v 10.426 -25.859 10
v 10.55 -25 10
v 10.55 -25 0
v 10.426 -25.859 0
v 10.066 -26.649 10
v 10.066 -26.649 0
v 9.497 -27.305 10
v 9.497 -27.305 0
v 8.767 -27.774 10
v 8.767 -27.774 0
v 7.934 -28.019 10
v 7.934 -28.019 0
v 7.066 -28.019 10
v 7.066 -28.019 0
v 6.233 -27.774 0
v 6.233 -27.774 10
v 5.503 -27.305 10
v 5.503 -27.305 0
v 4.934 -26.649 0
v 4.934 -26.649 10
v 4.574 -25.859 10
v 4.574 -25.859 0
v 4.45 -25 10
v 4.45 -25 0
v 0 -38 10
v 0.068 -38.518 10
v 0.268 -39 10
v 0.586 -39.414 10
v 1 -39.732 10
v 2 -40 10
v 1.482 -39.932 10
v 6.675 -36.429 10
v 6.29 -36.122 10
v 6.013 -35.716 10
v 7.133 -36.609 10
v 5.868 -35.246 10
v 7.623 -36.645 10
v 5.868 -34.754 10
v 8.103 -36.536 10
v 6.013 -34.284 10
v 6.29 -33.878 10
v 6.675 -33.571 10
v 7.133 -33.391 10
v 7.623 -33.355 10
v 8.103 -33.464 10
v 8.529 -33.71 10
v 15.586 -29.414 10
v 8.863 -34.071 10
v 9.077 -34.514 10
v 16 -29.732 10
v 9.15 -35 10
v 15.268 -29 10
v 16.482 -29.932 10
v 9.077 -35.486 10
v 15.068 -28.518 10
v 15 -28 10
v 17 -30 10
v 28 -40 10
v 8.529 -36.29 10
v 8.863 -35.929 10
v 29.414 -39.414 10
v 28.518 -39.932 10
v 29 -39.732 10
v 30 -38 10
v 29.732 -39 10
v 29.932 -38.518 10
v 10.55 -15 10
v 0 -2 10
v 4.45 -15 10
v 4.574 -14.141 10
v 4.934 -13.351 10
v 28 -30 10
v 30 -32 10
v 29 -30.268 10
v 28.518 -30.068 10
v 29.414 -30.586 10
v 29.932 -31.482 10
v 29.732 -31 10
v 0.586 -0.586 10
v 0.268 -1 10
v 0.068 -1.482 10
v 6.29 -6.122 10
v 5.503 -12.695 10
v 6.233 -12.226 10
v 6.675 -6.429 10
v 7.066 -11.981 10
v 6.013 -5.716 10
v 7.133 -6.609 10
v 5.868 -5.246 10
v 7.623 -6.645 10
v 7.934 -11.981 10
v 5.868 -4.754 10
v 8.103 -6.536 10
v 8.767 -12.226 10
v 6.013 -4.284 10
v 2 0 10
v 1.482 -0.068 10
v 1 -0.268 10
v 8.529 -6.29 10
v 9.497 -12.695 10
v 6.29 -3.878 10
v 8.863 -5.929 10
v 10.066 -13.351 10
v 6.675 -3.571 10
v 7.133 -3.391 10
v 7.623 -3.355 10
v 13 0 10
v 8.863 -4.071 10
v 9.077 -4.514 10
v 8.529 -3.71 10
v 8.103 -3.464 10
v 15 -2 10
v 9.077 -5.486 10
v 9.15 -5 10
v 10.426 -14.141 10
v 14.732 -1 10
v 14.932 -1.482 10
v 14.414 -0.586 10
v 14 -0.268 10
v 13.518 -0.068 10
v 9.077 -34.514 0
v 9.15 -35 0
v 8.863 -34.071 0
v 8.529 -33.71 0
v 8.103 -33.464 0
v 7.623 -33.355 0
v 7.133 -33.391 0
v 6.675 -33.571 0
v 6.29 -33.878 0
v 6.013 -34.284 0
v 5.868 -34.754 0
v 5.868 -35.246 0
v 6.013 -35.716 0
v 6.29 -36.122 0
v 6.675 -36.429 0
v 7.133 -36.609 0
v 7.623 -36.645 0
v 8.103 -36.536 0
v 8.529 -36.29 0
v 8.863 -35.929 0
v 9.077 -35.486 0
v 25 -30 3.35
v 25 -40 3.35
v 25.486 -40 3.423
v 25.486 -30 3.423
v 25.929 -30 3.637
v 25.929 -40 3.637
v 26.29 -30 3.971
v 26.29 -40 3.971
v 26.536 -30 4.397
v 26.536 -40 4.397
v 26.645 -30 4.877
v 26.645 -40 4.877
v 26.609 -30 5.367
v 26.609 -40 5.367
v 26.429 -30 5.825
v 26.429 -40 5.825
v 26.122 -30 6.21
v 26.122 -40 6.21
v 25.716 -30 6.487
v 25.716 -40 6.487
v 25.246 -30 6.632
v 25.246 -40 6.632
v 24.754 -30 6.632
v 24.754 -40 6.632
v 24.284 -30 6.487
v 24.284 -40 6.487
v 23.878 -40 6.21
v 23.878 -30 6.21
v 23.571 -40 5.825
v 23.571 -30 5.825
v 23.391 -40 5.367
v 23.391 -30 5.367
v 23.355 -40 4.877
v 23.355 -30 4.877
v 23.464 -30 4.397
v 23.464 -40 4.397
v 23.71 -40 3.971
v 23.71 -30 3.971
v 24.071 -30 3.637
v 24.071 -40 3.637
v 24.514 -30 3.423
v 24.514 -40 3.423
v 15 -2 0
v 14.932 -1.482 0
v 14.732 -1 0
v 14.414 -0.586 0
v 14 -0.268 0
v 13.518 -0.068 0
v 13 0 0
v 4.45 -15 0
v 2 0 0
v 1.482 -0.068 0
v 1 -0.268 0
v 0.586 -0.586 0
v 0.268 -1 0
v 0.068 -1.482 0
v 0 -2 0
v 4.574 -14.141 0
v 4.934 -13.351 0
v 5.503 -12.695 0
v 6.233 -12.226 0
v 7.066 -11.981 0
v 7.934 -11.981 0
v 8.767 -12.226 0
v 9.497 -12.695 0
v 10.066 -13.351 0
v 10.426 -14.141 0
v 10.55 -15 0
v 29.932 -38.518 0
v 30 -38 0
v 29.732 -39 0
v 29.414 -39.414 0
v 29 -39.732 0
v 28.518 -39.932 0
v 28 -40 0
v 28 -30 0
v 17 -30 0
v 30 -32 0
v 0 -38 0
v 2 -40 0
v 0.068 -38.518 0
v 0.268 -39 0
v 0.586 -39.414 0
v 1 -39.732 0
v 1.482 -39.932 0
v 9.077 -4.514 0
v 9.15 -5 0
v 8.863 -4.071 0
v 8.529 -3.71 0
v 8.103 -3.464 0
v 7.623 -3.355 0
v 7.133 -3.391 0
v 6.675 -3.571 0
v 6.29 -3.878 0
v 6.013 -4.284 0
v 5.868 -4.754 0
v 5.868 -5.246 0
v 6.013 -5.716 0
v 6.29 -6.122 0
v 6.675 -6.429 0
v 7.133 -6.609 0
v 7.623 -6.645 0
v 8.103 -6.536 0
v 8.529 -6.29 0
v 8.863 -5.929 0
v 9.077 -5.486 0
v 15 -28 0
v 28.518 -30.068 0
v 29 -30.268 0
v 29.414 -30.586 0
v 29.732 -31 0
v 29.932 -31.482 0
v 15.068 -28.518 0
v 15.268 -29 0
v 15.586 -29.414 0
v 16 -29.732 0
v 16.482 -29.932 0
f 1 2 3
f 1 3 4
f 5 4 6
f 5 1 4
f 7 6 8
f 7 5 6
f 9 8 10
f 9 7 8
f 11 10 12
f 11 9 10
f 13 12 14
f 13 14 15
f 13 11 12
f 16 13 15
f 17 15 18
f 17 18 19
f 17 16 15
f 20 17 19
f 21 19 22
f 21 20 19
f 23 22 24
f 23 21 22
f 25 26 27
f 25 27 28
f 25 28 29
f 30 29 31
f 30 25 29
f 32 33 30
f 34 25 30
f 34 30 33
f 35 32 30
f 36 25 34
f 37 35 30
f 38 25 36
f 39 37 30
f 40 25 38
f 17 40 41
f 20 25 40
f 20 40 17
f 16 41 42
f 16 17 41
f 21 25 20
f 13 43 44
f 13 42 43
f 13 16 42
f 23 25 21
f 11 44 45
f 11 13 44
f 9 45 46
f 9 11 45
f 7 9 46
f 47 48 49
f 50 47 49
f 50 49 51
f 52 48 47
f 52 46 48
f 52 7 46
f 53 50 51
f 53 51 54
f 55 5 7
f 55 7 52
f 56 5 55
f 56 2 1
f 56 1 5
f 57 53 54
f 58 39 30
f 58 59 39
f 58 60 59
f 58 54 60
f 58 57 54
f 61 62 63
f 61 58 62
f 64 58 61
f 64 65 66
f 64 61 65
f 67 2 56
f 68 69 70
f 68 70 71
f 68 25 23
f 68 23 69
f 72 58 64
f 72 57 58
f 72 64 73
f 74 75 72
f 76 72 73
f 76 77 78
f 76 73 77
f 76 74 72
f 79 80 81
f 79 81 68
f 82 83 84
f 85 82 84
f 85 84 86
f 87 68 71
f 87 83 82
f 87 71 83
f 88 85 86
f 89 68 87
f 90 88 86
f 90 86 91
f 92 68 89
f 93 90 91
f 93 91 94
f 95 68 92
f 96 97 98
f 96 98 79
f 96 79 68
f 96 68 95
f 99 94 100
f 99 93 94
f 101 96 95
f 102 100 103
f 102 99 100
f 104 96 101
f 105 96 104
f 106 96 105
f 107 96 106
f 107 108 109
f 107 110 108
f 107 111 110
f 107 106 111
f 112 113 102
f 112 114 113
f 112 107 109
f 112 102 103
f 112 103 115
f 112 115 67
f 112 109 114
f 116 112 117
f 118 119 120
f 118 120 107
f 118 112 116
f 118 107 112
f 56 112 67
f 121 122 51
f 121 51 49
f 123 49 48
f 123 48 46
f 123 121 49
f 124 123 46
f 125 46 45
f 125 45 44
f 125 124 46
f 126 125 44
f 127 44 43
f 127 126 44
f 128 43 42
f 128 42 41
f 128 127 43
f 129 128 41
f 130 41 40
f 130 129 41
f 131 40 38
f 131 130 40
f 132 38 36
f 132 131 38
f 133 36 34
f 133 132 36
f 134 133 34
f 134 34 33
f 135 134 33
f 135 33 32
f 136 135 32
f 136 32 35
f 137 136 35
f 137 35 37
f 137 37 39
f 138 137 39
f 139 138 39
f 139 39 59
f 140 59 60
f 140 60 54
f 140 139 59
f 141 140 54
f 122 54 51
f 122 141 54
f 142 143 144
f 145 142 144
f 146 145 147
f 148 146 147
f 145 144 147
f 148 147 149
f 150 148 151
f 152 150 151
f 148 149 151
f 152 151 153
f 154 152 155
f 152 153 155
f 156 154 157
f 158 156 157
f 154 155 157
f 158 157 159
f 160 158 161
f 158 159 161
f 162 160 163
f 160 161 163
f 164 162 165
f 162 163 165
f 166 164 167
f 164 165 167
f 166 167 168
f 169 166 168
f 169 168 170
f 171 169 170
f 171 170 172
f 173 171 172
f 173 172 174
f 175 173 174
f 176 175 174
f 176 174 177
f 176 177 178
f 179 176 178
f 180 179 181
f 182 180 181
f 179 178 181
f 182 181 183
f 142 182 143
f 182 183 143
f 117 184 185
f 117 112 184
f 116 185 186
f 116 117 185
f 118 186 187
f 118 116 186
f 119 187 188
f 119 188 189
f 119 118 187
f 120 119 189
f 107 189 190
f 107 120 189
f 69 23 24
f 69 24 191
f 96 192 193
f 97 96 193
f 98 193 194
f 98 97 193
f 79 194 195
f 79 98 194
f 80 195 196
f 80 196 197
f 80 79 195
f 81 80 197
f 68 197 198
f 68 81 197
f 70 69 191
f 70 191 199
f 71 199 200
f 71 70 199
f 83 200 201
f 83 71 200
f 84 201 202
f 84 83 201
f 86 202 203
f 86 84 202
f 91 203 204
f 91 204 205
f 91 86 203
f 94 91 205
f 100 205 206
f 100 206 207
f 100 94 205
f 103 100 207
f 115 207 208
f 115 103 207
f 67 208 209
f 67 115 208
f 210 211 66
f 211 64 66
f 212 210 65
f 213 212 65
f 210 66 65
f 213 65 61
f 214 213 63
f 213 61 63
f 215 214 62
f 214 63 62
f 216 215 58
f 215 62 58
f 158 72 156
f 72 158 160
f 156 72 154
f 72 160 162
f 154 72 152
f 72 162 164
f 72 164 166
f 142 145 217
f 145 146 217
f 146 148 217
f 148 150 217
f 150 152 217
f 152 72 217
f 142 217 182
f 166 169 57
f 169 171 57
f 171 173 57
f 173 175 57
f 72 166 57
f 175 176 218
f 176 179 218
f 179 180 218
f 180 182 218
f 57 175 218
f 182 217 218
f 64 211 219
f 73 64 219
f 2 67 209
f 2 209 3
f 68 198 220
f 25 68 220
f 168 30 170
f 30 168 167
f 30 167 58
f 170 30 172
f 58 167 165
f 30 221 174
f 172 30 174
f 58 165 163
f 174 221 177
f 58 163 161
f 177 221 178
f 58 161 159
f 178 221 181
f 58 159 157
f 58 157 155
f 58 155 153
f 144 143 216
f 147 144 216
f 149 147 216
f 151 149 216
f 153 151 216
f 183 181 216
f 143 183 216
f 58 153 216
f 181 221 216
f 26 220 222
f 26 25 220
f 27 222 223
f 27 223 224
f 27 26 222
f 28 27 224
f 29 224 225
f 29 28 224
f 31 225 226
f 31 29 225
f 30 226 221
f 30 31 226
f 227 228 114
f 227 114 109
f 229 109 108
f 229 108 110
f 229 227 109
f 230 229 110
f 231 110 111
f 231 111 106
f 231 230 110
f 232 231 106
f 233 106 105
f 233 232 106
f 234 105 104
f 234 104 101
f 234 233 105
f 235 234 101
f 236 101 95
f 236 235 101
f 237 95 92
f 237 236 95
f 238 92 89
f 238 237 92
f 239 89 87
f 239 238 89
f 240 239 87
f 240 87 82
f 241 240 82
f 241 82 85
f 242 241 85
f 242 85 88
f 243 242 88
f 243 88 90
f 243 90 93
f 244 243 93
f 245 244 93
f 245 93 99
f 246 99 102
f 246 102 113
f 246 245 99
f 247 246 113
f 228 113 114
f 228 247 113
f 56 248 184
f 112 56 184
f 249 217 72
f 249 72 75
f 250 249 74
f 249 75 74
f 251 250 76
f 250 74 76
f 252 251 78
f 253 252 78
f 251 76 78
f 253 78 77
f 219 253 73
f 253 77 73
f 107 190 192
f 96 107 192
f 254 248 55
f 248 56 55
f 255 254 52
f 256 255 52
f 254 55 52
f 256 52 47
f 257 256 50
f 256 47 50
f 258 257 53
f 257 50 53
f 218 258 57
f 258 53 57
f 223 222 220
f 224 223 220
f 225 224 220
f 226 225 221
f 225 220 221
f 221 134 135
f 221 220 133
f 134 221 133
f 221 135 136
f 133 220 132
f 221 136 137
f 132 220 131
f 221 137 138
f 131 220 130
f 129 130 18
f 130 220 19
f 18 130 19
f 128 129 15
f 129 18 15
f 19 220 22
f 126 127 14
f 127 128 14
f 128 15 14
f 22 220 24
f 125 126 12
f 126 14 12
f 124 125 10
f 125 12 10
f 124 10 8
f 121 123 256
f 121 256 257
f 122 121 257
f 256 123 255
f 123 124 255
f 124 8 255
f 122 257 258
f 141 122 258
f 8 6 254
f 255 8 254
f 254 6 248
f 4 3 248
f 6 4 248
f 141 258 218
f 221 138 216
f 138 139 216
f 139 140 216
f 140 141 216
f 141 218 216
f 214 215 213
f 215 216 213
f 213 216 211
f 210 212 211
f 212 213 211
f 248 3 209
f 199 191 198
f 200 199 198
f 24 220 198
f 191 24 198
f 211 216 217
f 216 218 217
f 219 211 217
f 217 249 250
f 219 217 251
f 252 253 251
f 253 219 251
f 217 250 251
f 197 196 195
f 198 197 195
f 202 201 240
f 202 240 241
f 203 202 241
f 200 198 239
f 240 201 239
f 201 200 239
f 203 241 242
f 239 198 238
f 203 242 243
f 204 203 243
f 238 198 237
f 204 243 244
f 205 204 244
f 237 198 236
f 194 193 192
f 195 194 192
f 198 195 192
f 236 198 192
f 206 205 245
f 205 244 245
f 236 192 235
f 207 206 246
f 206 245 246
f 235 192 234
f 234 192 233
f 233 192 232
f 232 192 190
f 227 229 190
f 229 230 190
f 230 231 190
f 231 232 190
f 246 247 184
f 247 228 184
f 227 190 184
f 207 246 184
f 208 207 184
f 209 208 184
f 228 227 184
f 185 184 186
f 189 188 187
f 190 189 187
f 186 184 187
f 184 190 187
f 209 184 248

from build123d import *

# Parameters (mm, degrees)
SKETCH_1_R          = 1.65
EXTRUDE_1_DEPTH     = 10
SKETCH_5_R          = 1.65
CUT_EXTRUDE_2_DEPTH = 10
BODY_CUT_DEPTH      = 10
FILLET_1_R          = 2
FILLET_2_R          = 2


with BuildPart() as part:
    # ｽｹｯﾁ1 → ﾎﾞｽ - 押し出し1 (new body)
    with BuildSketch(Plane.XY):
        Polygon((0, 0), (0, -40), (30, -40), (30, -30), (15, -30), (15, 0), align=None)
        with Locations((7.5, -5)):
            Circle(SKETCH_1_R, mode=Mode.SUBTRACT)
        with Locations((7.5, -35)):
            Circle(SKETCH_1_R, mode=Mode.SUBTRACT)
    extrude(amount=EXTRUDE_1_DEPTH)

    # ｽｹｯﾁ5 → ｶｯﾄ - 押し出し2 (cut)
    with BuildSketch(Plane.XZ.offset(40)):
        with Locations(Location((25, 5, 0), (0, 0, 270))):
            Circle(SKETCH_5_R)
    extrude(amount=-CUT_EXTRUDE_2_DEPTH, mode=Mode.SUBTRACT)

    # ｽｹｯﾁ7 → body cut (cut)
    with BuildSketch(Plane.XY.offset(10)):
        with BuildLine():
            Line((10.55, -15), (10.55, -25))
            ThreePointArc((10.55, -25), (7.5, -28.05), (4.45, -25))
            Line((4.45, -25), (4.45, -15))
            ThreePointArc((4.45, -15), (7.5, -11.95), (10.55, -15))
        make_face()
    extrude(amount=-BODY_CUT_DEPTH, mode=Mode.SUBTRACT)

    # ﾌｨﾚｯﾄ1
    fillet_1_edges = [part.edges().sort_by_distance(p)[0] for p in [
        (15, -30, 5),
    ]]
    fillet(fillet_1_edges, radius=FILLET_1_R)

    # ﾌｨﾚｯﾄ2
    fillet_2_edges = [part.edges().sort_by_distance(p)[0] for p in [
        (15, 0, 5),
        (30, -30, 5),
        (30, -40, 5),
        (0, -40, 5),
        (0, 0, 5),
    ]]
    fillet(fillet_2_edges, radius=FILLET_2_R)


solid = part.part
